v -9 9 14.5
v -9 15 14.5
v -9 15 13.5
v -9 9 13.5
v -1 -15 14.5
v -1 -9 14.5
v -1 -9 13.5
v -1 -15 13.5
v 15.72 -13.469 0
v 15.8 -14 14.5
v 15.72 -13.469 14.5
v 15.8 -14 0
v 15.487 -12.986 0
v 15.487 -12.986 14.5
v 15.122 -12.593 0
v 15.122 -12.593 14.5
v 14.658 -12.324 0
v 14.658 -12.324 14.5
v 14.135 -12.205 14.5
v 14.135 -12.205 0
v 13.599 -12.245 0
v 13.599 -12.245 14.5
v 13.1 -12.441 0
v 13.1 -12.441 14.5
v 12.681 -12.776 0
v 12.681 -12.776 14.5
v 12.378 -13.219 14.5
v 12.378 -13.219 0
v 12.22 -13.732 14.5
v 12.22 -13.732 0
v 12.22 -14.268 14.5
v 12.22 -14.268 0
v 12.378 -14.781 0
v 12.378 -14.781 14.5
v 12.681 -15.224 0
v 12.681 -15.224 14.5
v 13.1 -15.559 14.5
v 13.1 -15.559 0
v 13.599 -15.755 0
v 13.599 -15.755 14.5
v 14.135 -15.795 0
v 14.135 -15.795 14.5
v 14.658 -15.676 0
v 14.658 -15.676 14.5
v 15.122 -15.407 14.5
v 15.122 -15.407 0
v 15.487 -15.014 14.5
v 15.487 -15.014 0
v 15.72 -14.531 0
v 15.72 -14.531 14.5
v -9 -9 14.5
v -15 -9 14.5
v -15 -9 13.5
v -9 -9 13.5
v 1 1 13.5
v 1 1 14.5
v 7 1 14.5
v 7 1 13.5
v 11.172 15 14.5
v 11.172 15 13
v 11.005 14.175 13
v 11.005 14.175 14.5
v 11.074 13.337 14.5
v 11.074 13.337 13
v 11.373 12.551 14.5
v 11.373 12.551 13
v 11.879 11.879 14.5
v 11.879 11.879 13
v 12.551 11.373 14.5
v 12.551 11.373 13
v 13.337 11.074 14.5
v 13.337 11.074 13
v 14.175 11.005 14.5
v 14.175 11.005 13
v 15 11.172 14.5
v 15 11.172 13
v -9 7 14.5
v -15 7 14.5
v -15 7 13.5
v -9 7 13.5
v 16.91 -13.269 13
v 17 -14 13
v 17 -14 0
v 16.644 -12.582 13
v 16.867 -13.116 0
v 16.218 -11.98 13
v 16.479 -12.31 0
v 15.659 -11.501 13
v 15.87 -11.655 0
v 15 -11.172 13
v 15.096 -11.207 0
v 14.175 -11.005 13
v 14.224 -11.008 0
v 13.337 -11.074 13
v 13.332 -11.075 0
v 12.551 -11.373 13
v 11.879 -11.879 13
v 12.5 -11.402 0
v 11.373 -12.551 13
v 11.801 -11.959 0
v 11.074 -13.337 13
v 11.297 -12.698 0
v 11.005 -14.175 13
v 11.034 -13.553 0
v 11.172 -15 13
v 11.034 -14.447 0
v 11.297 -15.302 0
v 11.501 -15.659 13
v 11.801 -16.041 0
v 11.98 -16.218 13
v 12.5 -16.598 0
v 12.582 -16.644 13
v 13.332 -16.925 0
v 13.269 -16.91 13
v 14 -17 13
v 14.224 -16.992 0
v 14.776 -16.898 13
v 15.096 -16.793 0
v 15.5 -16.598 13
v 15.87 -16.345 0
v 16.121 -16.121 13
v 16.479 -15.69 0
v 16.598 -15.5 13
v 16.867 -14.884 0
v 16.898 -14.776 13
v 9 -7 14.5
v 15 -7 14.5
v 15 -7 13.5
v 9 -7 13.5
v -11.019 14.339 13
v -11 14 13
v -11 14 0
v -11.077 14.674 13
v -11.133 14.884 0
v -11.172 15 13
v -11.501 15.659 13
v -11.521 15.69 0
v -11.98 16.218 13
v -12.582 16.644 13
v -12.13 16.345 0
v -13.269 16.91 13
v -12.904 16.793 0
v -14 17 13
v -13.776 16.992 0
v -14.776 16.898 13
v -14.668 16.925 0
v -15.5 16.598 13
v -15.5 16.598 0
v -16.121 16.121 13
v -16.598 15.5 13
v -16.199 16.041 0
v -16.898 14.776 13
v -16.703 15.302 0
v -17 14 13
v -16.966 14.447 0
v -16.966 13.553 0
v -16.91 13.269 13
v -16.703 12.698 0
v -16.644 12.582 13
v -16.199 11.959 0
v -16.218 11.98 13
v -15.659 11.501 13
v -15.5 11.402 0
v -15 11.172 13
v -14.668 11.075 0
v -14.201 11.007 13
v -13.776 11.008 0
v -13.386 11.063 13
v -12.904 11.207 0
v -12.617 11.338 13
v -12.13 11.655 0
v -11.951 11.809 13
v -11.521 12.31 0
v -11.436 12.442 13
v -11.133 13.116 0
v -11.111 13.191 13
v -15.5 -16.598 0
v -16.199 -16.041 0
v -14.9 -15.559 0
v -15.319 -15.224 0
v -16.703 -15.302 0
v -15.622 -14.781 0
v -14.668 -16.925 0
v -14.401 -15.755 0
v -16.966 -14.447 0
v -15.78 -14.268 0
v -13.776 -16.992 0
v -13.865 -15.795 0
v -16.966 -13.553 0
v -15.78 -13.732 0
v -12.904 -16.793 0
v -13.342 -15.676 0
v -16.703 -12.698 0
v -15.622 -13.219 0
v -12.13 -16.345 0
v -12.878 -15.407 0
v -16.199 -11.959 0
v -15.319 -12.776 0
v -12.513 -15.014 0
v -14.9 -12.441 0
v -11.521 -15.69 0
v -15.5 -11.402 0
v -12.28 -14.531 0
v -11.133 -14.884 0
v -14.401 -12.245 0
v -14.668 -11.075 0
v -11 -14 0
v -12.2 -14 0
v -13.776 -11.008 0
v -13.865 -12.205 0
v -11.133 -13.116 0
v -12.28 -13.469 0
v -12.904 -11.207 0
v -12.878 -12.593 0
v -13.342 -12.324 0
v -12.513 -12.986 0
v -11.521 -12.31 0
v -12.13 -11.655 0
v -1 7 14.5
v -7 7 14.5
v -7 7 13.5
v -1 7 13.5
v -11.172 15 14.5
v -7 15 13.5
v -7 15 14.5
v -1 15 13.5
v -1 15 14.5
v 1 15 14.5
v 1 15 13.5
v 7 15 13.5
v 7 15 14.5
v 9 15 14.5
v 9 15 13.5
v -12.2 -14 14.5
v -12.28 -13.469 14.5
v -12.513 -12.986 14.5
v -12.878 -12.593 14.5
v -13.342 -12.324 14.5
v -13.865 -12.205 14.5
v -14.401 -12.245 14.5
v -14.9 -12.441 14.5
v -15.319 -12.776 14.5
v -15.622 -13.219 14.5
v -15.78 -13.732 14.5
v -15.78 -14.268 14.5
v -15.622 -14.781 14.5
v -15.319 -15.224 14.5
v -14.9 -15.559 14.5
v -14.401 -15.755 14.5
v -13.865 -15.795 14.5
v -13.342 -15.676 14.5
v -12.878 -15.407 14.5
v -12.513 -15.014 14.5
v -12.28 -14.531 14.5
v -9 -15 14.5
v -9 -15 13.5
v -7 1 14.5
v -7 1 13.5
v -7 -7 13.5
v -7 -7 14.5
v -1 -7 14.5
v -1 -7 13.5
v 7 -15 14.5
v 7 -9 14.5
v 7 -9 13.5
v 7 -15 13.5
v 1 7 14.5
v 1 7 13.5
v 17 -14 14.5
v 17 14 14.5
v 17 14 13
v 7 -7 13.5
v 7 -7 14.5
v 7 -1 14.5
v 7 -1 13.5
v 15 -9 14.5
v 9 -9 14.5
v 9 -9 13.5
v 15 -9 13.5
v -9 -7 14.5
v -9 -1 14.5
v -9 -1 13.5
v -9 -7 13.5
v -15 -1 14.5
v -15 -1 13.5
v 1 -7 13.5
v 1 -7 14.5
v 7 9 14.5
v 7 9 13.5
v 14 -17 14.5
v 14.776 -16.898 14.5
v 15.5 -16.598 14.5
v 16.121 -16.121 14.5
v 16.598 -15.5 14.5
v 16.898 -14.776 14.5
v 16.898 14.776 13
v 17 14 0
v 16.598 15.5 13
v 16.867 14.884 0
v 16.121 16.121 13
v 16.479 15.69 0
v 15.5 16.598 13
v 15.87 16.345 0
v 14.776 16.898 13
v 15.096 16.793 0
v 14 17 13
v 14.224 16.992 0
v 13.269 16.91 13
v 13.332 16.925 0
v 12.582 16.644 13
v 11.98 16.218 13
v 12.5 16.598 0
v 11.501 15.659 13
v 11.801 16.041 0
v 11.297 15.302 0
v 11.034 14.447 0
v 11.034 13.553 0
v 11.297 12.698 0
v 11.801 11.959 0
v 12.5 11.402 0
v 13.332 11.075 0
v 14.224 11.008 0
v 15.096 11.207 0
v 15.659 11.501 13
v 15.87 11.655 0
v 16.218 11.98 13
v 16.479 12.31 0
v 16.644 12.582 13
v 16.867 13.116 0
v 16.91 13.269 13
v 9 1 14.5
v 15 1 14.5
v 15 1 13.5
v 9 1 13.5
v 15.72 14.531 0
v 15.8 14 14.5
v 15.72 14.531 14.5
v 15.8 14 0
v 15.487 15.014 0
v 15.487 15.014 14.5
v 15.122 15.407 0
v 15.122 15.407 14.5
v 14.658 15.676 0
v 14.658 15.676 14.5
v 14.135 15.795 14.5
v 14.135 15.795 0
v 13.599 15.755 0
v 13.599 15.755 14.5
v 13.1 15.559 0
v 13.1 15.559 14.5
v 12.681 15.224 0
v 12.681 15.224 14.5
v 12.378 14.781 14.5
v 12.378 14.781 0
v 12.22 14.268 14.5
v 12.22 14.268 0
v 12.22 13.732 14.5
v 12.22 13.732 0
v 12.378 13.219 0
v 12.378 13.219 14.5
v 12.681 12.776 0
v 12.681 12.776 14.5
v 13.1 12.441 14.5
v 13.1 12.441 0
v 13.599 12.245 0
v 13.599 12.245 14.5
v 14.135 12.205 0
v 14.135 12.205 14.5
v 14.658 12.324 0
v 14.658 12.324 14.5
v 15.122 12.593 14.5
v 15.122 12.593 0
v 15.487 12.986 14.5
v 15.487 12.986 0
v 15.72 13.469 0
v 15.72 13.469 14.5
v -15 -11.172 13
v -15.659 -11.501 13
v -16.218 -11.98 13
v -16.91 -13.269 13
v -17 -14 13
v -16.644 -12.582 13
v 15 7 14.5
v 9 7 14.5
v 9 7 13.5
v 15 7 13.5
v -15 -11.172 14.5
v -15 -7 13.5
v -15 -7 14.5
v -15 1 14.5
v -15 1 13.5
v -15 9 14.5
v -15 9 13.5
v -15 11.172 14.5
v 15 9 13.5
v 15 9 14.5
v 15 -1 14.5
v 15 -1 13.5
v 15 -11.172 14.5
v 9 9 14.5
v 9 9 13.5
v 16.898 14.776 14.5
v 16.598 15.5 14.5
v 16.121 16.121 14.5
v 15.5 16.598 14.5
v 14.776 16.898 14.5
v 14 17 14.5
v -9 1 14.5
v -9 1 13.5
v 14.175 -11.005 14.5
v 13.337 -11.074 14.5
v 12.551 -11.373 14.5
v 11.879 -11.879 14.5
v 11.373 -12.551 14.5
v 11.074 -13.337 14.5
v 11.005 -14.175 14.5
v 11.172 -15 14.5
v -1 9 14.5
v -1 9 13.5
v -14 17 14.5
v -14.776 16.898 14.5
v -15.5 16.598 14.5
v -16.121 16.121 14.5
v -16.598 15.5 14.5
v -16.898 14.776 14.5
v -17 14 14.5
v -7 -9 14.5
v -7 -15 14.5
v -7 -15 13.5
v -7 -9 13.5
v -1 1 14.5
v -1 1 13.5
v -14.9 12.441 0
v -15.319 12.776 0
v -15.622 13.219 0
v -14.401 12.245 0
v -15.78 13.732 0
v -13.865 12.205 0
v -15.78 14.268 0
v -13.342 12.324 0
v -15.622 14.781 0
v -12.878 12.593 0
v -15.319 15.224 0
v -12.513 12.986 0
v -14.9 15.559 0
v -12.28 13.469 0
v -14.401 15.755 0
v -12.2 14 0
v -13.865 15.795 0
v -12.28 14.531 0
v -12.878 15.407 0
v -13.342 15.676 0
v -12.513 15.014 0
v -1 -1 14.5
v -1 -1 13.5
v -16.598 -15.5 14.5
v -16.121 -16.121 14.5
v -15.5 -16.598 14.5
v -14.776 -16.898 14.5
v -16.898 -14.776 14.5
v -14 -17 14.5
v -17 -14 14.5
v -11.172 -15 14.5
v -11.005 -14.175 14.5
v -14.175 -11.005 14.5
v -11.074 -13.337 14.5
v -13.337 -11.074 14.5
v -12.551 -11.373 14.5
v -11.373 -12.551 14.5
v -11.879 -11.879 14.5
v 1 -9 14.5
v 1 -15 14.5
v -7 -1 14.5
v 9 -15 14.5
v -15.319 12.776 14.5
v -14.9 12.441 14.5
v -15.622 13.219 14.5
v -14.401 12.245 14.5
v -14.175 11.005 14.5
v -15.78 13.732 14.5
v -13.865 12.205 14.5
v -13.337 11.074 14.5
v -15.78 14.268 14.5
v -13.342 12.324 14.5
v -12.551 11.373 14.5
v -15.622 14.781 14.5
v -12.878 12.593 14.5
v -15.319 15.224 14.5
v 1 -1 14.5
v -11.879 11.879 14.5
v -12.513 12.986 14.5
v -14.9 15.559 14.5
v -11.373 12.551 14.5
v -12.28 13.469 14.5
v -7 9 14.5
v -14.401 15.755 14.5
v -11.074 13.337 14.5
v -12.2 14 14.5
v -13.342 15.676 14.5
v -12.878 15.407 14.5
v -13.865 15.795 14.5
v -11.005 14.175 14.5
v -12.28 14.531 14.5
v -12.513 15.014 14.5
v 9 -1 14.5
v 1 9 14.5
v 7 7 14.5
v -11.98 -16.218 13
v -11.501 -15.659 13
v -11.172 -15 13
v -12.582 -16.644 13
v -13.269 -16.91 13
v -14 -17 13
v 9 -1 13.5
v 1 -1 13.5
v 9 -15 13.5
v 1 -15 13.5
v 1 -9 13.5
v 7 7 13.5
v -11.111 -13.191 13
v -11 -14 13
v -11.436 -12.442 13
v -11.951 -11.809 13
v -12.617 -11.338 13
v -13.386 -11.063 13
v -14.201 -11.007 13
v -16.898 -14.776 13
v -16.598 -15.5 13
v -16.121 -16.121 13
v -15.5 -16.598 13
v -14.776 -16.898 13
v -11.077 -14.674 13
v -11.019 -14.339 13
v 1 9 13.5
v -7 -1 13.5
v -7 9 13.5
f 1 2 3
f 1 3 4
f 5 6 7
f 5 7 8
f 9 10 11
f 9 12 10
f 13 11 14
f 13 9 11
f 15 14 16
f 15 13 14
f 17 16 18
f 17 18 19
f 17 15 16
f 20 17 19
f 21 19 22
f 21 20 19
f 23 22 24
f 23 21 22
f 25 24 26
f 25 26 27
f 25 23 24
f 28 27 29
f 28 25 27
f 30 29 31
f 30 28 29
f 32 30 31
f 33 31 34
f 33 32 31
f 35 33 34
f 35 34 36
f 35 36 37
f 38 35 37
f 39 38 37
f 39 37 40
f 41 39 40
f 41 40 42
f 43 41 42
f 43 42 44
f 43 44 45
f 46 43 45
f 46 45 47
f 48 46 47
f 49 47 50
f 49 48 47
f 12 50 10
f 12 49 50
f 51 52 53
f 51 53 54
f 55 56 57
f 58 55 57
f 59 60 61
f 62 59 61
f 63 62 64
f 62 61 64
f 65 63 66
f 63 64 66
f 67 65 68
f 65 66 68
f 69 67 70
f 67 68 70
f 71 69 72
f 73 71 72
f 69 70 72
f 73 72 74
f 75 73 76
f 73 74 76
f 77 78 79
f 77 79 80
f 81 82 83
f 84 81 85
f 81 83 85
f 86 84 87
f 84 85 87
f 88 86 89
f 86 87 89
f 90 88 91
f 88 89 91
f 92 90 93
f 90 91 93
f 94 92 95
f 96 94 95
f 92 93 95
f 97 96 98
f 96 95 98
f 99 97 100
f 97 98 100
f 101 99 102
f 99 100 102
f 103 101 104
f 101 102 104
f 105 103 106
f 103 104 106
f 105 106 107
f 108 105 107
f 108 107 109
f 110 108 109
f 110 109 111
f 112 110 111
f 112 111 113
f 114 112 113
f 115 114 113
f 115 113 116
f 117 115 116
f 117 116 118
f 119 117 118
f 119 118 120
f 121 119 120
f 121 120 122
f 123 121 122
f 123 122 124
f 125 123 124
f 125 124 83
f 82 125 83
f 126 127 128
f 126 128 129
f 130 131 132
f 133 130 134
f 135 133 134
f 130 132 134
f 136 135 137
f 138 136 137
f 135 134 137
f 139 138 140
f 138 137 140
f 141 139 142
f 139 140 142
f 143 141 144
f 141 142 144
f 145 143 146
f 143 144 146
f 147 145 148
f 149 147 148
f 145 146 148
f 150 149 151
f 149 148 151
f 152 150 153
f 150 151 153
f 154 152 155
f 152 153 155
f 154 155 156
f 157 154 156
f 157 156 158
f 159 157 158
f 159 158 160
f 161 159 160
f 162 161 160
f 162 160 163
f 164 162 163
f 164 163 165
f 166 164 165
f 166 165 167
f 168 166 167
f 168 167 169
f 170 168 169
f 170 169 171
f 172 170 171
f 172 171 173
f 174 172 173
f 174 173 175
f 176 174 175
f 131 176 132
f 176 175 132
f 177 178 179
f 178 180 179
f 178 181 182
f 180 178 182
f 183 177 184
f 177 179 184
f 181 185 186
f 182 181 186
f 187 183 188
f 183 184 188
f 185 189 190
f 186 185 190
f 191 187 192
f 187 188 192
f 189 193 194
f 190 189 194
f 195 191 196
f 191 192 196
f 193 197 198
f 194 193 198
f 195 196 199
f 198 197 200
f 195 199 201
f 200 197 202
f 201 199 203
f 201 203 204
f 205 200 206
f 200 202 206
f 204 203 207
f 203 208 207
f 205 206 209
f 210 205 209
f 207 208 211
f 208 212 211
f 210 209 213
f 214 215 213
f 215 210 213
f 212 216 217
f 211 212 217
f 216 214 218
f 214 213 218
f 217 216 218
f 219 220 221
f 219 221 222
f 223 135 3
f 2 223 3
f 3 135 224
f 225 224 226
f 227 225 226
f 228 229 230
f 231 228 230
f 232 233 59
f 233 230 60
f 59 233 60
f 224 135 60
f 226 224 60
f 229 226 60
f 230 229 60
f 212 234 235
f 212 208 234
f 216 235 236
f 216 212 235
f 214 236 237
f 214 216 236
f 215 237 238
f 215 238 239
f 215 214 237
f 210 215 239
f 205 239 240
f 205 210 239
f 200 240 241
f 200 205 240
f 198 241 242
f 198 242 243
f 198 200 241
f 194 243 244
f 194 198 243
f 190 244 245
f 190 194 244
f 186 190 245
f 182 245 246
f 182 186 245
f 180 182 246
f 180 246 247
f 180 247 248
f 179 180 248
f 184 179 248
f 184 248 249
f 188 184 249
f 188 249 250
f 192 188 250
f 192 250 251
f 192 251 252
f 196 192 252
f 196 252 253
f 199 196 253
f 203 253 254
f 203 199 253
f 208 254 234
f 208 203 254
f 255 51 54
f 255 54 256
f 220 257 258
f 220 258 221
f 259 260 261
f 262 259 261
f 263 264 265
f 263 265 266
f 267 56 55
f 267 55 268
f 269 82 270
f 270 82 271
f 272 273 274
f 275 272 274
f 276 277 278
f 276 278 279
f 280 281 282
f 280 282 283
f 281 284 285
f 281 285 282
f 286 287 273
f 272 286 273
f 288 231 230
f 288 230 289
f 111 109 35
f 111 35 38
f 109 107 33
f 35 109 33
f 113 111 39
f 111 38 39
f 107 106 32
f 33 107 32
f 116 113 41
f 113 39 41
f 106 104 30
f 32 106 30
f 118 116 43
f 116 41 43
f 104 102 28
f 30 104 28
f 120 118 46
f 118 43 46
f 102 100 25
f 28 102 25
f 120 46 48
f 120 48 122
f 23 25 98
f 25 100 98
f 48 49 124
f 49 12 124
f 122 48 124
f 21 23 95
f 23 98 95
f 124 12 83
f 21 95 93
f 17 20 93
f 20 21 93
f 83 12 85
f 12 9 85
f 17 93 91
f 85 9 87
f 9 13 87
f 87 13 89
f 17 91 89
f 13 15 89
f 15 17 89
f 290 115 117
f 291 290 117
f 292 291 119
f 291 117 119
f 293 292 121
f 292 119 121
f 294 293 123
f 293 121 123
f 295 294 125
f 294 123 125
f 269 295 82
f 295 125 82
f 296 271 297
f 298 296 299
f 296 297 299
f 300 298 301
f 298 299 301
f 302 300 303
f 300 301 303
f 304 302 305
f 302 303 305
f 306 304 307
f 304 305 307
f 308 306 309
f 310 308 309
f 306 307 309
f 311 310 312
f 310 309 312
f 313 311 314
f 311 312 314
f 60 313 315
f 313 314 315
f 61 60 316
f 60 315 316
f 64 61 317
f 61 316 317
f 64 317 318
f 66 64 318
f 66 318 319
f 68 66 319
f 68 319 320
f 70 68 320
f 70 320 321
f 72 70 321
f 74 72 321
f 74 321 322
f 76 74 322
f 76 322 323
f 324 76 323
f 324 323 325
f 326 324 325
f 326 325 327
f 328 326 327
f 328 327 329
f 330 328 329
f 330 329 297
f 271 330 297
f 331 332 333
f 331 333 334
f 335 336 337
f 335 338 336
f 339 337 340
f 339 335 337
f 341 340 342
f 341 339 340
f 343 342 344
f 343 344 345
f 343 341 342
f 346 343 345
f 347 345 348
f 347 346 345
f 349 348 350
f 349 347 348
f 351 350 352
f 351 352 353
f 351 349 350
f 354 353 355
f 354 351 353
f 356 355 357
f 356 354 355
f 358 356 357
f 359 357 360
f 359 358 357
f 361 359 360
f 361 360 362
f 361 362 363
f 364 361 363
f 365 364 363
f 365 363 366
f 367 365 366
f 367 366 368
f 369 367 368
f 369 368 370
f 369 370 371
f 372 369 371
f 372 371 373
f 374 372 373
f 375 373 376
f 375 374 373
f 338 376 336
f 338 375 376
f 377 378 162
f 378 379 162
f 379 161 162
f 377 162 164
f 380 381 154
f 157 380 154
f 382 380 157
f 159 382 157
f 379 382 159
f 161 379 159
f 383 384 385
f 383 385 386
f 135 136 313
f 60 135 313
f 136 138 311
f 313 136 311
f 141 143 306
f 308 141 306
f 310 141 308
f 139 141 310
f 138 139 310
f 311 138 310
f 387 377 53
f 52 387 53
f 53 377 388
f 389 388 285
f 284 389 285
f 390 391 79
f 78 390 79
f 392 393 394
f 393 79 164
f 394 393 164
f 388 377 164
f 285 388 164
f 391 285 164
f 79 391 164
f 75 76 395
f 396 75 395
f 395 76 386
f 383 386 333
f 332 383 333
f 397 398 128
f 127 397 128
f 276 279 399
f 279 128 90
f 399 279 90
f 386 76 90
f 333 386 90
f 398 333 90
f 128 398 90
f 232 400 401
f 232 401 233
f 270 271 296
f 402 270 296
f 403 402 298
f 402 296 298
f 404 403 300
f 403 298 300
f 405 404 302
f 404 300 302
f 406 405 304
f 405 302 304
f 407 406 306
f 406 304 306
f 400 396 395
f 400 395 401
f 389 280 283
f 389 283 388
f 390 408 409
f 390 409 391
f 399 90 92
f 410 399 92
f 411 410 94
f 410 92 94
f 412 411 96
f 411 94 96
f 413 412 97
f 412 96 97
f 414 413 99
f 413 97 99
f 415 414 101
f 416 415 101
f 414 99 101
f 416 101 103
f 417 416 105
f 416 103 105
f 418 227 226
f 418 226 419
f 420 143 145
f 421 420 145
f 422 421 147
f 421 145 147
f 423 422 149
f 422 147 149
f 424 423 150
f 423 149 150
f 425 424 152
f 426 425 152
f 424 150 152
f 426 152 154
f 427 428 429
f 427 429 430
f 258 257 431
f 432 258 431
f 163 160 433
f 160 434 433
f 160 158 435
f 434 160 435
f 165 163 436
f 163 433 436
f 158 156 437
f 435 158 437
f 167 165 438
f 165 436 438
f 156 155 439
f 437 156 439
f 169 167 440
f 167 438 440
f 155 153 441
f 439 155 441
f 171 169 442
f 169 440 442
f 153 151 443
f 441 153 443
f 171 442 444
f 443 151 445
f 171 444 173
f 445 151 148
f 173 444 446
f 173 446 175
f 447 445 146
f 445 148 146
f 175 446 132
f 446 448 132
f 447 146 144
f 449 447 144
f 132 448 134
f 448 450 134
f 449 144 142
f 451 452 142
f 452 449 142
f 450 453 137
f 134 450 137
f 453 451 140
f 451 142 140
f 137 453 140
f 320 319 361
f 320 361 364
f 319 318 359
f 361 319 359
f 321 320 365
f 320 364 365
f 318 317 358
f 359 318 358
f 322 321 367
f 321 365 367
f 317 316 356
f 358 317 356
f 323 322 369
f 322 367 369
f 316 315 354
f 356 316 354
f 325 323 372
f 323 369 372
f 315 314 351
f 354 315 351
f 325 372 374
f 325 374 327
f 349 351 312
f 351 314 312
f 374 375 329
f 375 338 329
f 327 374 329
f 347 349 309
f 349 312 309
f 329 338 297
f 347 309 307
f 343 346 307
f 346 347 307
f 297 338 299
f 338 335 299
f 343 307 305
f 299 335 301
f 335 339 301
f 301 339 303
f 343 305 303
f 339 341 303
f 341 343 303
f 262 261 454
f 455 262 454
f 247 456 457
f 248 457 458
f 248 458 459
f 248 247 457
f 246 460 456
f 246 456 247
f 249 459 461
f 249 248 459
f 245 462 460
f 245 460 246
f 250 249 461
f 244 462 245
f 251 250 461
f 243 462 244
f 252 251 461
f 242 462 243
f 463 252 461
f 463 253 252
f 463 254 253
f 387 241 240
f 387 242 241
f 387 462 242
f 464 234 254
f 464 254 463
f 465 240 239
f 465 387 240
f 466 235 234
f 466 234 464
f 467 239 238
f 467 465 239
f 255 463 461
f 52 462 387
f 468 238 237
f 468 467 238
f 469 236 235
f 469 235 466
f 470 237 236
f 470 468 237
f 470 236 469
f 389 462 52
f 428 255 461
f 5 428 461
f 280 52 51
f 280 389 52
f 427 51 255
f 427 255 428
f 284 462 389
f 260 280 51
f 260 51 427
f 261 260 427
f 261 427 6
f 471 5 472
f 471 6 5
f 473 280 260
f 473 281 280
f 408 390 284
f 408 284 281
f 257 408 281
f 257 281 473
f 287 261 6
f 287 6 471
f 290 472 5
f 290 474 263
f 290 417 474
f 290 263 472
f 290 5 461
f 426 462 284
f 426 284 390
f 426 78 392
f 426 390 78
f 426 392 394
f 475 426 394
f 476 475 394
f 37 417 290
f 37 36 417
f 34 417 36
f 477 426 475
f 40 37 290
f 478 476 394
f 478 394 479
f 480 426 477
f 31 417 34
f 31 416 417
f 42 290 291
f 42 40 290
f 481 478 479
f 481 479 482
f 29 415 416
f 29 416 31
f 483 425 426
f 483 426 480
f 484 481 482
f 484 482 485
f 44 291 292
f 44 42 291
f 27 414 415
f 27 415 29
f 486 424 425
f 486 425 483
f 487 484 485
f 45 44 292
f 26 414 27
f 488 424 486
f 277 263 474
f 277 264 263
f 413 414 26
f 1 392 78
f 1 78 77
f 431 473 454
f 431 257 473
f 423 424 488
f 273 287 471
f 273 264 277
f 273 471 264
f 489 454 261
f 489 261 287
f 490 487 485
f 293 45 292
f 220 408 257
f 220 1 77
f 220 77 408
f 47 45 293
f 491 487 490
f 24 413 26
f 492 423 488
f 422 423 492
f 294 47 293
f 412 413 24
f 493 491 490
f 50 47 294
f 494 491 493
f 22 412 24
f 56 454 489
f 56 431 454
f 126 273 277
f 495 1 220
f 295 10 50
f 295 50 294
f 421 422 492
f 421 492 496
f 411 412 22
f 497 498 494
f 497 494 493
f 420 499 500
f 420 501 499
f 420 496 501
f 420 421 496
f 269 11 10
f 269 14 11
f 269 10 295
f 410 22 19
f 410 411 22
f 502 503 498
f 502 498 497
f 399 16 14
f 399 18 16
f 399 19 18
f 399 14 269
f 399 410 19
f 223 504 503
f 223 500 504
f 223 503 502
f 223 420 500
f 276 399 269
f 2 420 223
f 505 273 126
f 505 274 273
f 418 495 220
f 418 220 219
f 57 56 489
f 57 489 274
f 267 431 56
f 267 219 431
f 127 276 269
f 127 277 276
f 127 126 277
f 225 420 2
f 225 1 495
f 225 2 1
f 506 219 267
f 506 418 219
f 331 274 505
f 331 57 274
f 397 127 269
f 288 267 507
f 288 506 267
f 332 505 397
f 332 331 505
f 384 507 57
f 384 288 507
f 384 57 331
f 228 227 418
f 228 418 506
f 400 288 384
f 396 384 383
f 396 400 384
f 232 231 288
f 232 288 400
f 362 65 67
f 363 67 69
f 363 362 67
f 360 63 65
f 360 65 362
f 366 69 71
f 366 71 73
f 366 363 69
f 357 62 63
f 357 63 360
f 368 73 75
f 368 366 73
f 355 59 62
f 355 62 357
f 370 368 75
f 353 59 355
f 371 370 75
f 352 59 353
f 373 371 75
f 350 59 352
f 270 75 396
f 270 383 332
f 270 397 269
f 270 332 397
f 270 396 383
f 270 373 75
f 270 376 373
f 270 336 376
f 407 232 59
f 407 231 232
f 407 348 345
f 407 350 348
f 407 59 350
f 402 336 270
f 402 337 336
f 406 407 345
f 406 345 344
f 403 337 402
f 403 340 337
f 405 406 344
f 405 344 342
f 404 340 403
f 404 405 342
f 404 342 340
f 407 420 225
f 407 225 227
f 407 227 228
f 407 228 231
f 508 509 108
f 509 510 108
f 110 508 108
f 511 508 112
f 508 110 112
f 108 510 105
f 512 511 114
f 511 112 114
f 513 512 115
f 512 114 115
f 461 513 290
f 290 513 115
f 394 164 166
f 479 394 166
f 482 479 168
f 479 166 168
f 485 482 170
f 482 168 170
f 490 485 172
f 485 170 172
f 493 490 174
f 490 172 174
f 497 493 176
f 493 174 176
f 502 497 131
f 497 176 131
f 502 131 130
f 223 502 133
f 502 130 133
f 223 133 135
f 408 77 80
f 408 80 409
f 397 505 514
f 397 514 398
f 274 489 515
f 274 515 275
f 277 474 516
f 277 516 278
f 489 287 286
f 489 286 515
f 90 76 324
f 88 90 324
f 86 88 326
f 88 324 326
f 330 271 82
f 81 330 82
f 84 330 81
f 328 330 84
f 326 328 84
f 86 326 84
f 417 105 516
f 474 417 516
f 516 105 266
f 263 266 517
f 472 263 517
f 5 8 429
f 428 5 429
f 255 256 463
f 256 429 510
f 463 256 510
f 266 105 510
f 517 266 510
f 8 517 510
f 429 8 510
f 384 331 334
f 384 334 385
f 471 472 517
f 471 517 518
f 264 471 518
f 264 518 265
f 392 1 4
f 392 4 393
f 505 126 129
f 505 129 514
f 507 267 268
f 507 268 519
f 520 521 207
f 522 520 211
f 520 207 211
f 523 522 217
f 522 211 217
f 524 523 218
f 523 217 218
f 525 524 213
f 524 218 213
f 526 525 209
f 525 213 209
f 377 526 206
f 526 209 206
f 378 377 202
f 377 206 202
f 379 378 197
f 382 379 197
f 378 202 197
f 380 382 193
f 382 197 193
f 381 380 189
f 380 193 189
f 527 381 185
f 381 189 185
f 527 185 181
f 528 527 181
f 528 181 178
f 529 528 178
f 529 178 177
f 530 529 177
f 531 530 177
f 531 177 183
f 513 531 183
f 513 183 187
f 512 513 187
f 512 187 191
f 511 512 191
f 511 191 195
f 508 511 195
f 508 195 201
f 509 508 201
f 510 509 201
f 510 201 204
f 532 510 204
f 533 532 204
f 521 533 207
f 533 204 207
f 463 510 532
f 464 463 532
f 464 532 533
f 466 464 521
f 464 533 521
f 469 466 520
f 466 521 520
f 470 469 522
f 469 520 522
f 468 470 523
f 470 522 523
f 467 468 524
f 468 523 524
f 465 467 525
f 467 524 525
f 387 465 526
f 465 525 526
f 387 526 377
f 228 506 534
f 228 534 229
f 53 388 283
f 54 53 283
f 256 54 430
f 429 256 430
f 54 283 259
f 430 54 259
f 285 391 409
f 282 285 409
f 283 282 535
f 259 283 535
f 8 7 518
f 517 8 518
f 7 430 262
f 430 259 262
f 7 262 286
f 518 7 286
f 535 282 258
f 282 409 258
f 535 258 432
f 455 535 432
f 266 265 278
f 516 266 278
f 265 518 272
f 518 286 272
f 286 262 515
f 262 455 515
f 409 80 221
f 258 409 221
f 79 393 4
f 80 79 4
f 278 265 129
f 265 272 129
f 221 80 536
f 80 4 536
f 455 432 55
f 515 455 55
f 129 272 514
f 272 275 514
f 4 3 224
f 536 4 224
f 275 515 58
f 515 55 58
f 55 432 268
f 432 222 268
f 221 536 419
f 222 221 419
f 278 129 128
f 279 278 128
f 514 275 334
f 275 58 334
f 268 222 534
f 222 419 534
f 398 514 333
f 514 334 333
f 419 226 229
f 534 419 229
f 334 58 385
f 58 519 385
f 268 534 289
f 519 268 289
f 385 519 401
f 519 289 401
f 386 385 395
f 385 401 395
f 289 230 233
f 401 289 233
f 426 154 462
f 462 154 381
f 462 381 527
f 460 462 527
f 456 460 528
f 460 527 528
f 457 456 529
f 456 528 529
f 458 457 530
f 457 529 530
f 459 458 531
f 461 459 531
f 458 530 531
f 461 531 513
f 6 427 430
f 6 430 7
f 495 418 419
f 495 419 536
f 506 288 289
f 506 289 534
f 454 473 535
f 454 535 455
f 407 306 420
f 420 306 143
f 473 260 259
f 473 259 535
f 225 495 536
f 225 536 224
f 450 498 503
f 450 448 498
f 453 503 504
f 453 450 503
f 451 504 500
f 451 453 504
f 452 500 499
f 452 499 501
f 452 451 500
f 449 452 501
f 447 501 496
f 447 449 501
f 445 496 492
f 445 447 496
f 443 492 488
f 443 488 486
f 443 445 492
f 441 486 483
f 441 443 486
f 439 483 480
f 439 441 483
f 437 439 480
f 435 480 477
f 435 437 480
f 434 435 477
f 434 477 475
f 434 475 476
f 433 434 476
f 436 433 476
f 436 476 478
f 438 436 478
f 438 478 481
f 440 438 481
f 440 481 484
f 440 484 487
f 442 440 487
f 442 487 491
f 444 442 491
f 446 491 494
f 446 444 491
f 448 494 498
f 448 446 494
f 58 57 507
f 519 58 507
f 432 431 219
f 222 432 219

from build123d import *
from build123d import SkipClean  # not in build123d's __all__

# Parameters (mm, degrees)
F0_R     = 3
F0_R_2   = 1.8
F1_DEPTH = 13
F2_R     = 1.8
F3_DEPTH = 1.5
F4_W     = 6
F4_H     = 6
F5_DEPTH = 1


with BuildPart() as f1:
    # F0 (on Top) → F1 (new body)
    with BuildSketch(Plane.XY):
        with Locations((-14, 14)):
            Circle(F0_R)
        with Locations((-14, 14)):
            Circle(F0_R_2, mode=Mode.SUBTRACT)
    extrude(amount=F1_DEPTH)



with BuildPart() as f1b:
    # F0 (on Top) → F1, piece 2 (new body)
    with BuildSketch(Plane.XY):
        with Locations((-14, -14)):
            Circle(F0_R)
        with Locations((-14, -14)):
            Circle(F0_R_2, mode=Mode.SUBTRACT)
    extrude(amount=F1_DEPTH)


with BuildPart() as f1c:
    # F0 (on Top) → F1, piece 3 (new body)
    with BuildSketch(Plane.XY):
        with Locations((14, -14)):
            Circle(F0_R)
        with Locations((14, -14)):
            Circle(F0_R_2, mode=Mode.SUBTRACT)
    extrude(amount=F1_DEPTH)


with BuildPart() as f1d:
    # F0 (on Top) → F1, piece 4 (new body)
    with BuildSketch(Plane.XY):
        with Locations((14, 14)):
            Circle(F0_R)
        with Locations((14, 14)):
            Circle(F0_R_2, mode=Mode.SUBTRACT)
    extrude(amount=F1_DEPTH)


with BuildPart() as f1_1:
    add(f1.part, clean=False)

    with SkipClean():  # cleaning this boolean's faces spoils the solid; the shape is the same uncleaned
        add(f1b.part)  # F3 merges F1b

    with SkipClean():  # cleaning this boolean's faces spoils the solid; the shape is the same uncleaned
        add(f1c.part)  # F3 merges F1c

    with SkipClean():  # cleaning this boolean's faces spoils the solid; the shape is the same uncleaned
        add(f1d.part)  # F3 merges F1d
    # F2 (on face) → F3 (join)
    with BuildSketch(Plane.XY.offset(13)):
        with BuildLine():
            Line((14, 17), (-14, 17))
            ThreePointArc((-14, 17), (-16.1213203436, 16.1213203436), (-17, 14))
            Line((-17, 14), (-17, -14))
            ThreePointArc((-17, -14), (-16.1213203436, -16.1213203436), (-14, -17))
            Line((-14, -17), (14, -17))
            ThreePointArc((14, -17), (16.1213203436, -16.1213203436), (17, -14))
            Line((17, -14), (17, 14))
            ThreePointArc((17, 14), (16.1213203436, 16.1213203436), (14, 17))
        make_face()
        with Locations((-14, -14)):
            Circle(F2_R, mode=Mode.SUBTRACT)
        with Locations((14, -14)):
            Circle(F2_R, mode=Mode.SUBTRACT)
        with Locations((-14, 14)):
            Circle(F2_R, mode=Mode.SUBTRACT)
        with BuildLine():
            Line((-15, -11.1715728753), (-15, 11.1715728753))
            ThreePointArc((-15, 11.1715728753), (-11.8786796564, 11.8786796564), (-11.1715728753, 15))
            Line((-11.1715728753, 15), (11.1715728753, 15))
            ThreePointArc((11.1715728753, 15), (11.8786796564, 11.8786796564), (15, 11.1715728753))
            Line((15, 11.1715728753), (15, -11.1715728753))
            ThreePointArc((15, -11.1715728753), (11.8786796564, -11.8786796564), (11.1715728753, -15))
            Line((11.1715728753, -15), (-11.1715728753, -15))
            ThreePointArc((-11.1715728753, -15), (-11.8786796564, -11.8786796564), (-15, -11.1715728753))
        make_face(mode=Mode.SUBTRACT)
        with Locations((14, 14)):
            Circle(F2_R, mode=Mode.SUBTRACT)
    with SkipClean():  # cleaning this boolean's faces spoils the solid; the shape is the same uncleaned
        extrude(amount=F3_DEPTH)

    # F4 (on face) → F5 (join)
    with BuildSketch(Plane.XY.offset(14.5)):
        Polygon((1, 15), (-1, 15), (-1, 9), (-7, 9), (-7, 15), (-9, 15), (-9, 9), (-15, 9), (-15, 7), (-9, 7), (-9, 1), (-15, 1), (-15, -1), (-9, -1), (-9, -7), (-15, -7), (-15, -9), (-9, -9), (-9, -15), (-7, -15), (-7, -9), (-1, -9), (-1, -15), (1, -15), (1, -9), (7, -9), (7, -15), (9, -15), (9, -9), (15, -9), (15, -7), (9, -7), (9, -1), (15, -1), (15, 1), (9, 1), (9, 7), (15, 7), (15, 9), (9, 9), (9, 15), (7, 15), (7, 9), (1, 9), align=None)
        with Locations((-4, -4)):
            Rectangle(F4_W, F4_H, mode=Mode.SUBTRACT)
        with Locations((4, -4)):
            Rectangle(F4_W, F4_H, mode=Mode.SUBTRACT)
        with Locations((-4, 4)):
            Rectangle(F4_W, F4_H, mode=Mode.SUBTRACT)
        with Locations((4, 4)):
            Rectangle(F4_W, F4_H, mode=Mode.SUBTRACT)
    extrude(amount=-F5_DEPTH)


solid = f1_1.part
